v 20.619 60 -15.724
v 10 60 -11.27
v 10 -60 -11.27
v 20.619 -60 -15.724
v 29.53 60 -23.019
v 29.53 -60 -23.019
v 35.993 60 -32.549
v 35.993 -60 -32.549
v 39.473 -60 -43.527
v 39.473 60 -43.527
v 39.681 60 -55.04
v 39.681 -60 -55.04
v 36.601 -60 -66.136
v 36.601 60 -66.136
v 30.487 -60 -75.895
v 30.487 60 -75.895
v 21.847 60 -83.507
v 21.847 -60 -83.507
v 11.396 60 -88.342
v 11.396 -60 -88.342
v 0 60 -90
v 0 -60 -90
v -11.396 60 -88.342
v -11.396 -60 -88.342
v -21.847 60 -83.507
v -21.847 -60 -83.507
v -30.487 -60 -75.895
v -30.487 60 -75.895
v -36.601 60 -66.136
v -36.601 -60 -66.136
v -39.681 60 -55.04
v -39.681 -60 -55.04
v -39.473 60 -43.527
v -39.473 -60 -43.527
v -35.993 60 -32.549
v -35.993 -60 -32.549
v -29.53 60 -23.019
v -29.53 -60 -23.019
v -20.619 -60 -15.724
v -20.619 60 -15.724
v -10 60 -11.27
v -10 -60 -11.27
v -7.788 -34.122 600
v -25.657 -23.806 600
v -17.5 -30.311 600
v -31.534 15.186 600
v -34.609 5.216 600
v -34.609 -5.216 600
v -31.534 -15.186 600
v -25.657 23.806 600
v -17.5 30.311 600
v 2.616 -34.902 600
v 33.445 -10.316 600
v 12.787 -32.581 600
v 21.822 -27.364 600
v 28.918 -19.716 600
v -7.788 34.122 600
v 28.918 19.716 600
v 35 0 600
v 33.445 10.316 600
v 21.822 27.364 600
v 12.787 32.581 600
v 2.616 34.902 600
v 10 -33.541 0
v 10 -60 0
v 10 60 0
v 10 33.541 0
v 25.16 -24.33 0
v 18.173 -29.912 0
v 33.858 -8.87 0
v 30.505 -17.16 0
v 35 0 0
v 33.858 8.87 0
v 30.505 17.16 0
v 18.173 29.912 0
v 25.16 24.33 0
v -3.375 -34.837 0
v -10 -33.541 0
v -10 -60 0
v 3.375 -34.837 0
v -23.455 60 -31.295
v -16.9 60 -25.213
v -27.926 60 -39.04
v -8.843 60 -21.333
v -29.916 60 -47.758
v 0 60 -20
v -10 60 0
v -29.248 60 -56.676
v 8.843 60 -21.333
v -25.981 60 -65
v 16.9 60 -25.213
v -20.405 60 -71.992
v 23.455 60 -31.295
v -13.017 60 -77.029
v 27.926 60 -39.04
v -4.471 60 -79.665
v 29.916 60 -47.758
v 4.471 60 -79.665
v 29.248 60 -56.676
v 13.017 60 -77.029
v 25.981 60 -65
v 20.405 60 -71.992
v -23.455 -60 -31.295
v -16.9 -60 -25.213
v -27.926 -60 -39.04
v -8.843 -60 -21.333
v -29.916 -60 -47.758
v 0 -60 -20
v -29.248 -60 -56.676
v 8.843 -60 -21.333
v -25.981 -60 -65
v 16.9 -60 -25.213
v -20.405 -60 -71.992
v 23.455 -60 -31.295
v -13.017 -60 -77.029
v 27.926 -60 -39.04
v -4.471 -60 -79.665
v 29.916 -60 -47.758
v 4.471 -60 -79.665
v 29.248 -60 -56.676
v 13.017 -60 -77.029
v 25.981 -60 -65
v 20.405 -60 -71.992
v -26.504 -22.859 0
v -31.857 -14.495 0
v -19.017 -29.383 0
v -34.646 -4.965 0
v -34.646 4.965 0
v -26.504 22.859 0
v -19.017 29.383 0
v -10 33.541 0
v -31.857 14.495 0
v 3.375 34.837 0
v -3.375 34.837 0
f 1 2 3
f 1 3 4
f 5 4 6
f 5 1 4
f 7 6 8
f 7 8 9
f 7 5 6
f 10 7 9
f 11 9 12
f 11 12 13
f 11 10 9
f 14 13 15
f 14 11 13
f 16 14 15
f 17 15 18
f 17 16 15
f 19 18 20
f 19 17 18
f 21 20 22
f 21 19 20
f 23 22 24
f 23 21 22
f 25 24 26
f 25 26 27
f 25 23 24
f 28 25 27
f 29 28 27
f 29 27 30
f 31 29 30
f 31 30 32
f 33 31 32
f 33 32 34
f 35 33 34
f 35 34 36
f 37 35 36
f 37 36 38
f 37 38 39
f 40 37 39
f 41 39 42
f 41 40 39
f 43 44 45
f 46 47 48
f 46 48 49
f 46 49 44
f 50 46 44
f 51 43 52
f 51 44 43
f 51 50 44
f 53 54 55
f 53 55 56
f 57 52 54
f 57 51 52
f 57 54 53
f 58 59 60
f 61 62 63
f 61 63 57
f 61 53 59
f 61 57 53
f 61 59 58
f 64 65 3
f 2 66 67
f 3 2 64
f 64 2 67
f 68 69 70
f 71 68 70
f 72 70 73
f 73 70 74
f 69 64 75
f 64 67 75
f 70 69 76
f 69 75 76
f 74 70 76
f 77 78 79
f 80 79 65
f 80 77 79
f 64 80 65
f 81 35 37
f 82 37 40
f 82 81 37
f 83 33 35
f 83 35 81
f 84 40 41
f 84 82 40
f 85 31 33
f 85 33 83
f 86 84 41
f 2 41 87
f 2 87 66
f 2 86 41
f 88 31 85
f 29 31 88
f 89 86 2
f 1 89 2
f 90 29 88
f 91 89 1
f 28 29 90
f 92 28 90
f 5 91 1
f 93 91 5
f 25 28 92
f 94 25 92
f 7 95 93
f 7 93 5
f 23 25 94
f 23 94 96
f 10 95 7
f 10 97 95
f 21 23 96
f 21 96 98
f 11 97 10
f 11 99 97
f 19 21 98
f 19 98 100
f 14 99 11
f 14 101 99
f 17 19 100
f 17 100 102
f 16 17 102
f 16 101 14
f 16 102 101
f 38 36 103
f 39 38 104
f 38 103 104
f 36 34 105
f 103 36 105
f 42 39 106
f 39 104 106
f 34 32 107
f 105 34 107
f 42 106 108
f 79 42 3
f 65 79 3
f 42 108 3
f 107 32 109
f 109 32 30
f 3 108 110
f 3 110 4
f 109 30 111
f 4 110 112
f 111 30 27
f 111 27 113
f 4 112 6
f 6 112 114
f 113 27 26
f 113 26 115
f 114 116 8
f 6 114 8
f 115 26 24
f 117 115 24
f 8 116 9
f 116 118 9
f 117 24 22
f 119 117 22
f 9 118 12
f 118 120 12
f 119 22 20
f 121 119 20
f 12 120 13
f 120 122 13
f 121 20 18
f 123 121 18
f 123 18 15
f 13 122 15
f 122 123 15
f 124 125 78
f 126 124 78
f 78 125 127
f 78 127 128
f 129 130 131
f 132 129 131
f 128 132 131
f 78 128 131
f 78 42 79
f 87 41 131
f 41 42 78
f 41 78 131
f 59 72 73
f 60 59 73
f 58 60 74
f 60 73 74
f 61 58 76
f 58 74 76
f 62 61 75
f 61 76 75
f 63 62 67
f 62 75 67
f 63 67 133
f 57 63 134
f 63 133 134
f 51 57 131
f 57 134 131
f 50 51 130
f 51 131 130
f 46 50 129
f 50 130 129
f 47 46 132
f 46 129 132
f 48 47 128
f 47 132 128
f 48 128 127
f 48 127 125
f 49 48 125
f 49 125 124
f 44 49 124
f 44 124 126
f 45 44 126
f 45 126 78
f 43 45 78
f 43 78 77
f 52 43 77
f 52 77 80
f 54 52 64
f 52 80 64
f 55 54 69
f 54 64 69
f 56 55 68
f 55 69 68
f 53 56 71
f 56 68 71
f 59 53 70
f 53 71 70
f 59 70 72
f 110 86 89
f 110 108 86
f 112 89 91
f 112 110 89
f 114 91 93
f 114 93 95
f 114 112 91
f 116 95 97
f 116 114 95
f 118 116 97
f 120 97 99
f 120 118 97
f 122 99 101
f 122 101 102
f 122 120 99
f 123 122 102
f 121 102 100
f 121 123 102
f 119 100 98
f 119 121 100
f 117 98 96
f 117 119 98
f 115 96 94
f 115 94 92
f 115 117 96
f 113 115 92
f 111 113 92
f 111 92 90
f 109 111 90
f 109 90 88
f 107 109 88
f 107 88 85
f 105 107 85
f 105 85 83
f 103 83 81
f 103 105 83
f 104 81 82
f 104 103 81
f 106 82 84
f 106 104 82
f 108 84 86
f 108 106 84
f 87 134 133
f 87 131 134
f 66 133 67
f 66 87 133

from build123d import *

# Parameters (mm, degrees)
IZIM1_R                     = 35
Y_KSEKLIK_EKSTR_ZYON1_DEPTH = 600
IZIM2_R                     = 30
Y_KSEKLIK_EKSTR_ZYON2_DEPTH = 60


with BuildPart() as part:
    # Çizim1 → Yükseklik-Ekstrüzyon1 (new body)
    with BuildSketch(Plane.XY):
        Circle(IZIM1_R)
    extrude(amount=Y_KSEKLIK_EKSTR_ZYON1_DEPTH)

    # Çizim2 → Yükseklik-Ekstrüzyon2 (add, symmetric)
    with BuildSketch(Plane(origin=(0, 0, 0), x_dir=(1, 0, 0), z_dir=(0, 1, 0))):
        with BuildLine():
            Line((10, 0), (10, 11.270166538))
            ThreePointArc((10, 11.270166538), (0, 90), (-10, 11.270166538))
            Line((-10, 11.270166538), (-10, 0))
            Line((-10, 0), (10, 0))
        make_face()
        with Locations(Location((0, 50, 0), (0, 0, 270))):
            Circle(IZIM2_R, mode=Mode.SUBTRACT)
    extrude(amount=Y_KSEKLIK_EKSTR_ZYON2_DEPTH, both=True)


solid = part.part
